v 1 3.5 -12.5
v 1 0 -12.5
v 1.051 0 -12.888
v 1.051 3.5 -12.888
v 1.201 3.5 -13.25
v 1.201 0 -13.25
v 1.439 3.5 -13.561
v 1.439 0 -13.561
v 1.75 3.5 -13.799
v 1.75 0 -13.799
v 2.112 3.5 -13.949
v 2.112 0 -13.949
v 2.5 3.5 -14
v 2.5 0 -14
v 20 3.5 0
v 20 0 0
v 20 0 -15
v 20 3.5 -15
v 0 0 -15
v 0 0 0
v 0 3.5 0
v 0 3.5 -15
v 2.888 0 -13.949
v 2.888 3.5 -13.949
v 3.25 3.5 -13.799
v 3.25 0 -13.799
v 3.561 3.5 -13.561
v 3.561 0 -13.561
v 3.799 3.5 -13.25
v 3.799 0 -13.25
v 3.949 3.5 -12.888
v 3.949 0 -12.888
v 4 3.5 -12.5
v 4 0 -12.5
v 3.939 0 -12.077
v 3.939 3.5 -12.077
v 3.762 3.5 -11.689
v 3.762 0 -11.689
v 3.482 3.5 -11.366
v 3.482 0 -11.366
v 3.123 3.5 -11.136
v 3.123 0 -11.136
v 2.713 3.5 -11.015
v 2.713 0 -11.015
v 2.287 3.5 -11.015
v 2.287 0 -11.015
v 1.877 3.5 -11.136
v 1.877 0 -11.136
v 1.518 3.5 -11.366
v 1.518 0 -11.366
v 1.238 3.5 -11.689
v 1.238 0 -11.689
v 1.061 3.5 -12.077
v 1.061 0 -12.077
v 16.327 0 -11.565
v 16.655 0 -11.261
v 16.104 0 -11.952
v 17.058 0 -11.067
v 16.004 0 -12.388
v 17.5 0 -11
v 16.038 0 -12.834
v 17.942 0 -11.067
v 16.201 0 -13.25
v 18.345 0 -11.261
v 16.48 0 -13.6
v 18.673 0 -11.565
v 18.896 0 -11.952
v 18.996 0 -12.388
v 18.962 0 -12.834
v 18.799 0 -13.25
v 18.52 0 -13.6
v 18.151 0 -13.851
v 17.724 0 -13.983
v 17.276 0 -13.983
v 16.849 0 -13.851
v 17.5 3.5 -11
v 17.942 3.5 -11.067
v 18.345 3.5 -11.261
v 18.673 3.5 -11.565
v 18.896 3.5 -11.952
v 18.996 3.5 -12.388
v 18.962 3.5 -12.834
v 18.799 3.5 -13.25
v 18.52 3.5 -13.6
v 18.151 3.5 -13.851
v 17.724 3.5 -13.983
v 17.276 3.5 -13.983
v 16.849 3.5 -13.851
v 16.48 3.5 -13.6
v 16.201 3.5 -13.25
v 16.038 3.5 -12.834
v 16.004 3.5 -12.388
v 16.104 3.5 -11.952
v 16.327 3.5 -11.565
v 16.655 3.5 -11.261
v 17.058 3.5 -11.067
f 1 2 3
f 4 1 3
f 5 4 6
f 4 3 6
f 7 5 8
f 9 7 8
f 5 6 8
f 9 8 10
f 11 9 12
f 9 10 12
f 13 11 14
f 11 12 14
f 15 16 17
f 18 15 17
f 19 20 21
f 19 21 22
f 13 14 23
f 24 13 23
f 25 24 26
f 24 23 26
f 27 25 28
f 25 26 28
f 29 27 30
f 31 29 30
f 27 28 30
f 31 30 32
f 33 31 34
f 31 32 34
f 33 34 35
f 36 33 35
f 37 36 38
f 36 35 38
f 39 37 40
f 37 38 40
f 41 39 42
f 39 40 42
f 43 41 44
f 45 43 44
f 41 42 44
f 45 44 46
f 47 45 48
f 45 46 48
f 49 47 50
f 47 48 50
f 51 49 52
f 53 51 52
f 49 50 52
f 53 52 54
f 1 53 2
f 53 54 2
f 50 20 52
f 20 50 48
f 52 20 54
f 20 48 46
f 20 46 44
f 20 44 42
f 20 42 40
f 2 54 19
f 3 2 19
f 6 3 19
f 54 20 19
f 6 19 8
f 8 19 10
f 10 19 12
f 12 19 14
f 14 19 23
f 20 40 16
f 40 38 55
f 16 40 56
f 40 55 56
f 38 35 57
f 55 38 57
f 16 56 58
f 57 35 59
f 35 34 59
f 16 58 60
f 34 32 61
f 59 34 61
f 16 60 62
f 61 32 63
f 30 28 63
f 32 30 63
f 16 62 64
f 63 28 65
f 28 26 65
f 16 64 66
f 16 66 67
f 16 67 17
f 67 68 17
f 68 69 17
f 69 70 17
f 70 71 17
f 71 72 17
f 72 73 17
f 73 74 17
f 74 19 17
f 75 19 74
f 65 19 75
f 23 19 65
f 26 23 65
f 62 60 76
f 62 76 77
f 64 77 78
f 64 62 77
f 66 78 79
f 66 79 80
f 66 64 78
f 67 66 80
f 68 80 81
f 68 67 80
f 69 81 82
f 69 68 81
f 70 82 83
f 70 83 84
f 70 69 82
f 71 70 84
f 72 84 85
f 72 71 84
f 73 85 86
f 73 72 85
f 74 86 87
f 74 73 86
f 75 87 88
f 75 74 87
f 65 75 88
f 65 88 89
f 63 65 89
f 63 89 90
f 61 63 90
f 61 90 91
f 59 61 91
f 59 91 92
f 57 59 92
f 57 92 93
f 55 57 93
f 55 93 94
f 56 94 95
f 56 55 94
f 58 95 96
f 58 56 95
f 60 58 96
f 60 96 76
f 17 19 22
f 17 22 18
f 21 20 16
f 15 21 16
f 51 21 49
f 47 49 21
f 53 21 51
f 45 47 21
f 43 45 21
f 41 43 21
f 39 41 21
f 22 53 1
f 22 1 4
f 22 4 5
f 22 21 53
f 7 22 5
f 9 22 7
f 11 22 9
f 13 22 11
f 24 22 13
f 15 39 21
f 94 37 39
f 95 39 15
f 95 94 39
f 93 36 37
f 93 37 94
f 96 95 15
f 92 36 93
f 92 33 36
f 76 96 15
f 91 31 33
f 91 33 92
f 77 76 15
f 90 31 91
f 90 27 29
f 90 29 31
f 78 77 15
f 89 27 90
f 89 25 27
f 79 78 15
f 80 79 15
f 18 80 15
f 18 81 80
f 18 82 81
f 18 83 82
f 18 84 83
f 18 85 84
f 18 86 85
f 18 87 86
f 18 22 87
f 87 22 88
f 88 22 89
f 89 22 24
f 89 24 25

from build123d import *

# Parameters (mm, degrees)
SKETCH1_W           = 10
SKETCH1_H           = 15
SKETCH1_R           = 1.5
BOSS_EXTRUDE1_DEPTH = 3.5


with BuildPart() as part:
    # Sketch1 → Boss-Extrude1 (new body)
    # profile 1 of 2: a face of its own
    with BuildSketch(Plane(origin=(0, 0, 0), x_dir=(1, 0, 0), z_dir=(0, 1, 0))):
        with Locations((15, 7.5)):
            Rectangle(SKETCH1_W, SKETCH1_H)
        with Locations(Location((17.5, 12.5, 0), (0, 0, 270))):
            Circle(SKETCH1_R, mode=Mode.SUBTRACT)
    # profile 2 of 2: a face of its own
    with BuildSketch(Plane(origin=(0, 0, 0), x_dir=(1, 0, 0), z_dir=(0, 1, 0))):
        with Locations((5, 7.5)):
            Rectangle(SKETCH1_W, SKETCH1_H)
        with BuildLine():
            ThreePointArc((1, 12.5), (1.439339828, 13.560660172), (2.5, 14))
            ThreePointArc((2.5, 14), (3.560660172, 13.560660172), (4, 12.5))
            ThreePointArc((4, 12.5), (2.5, 11), (1, 12.5))
        make_face(mode=Mode.SUBTRACT)
    extrude(amount=BOSS_EXTRUDE1_DEPTH)


solid = part.part
